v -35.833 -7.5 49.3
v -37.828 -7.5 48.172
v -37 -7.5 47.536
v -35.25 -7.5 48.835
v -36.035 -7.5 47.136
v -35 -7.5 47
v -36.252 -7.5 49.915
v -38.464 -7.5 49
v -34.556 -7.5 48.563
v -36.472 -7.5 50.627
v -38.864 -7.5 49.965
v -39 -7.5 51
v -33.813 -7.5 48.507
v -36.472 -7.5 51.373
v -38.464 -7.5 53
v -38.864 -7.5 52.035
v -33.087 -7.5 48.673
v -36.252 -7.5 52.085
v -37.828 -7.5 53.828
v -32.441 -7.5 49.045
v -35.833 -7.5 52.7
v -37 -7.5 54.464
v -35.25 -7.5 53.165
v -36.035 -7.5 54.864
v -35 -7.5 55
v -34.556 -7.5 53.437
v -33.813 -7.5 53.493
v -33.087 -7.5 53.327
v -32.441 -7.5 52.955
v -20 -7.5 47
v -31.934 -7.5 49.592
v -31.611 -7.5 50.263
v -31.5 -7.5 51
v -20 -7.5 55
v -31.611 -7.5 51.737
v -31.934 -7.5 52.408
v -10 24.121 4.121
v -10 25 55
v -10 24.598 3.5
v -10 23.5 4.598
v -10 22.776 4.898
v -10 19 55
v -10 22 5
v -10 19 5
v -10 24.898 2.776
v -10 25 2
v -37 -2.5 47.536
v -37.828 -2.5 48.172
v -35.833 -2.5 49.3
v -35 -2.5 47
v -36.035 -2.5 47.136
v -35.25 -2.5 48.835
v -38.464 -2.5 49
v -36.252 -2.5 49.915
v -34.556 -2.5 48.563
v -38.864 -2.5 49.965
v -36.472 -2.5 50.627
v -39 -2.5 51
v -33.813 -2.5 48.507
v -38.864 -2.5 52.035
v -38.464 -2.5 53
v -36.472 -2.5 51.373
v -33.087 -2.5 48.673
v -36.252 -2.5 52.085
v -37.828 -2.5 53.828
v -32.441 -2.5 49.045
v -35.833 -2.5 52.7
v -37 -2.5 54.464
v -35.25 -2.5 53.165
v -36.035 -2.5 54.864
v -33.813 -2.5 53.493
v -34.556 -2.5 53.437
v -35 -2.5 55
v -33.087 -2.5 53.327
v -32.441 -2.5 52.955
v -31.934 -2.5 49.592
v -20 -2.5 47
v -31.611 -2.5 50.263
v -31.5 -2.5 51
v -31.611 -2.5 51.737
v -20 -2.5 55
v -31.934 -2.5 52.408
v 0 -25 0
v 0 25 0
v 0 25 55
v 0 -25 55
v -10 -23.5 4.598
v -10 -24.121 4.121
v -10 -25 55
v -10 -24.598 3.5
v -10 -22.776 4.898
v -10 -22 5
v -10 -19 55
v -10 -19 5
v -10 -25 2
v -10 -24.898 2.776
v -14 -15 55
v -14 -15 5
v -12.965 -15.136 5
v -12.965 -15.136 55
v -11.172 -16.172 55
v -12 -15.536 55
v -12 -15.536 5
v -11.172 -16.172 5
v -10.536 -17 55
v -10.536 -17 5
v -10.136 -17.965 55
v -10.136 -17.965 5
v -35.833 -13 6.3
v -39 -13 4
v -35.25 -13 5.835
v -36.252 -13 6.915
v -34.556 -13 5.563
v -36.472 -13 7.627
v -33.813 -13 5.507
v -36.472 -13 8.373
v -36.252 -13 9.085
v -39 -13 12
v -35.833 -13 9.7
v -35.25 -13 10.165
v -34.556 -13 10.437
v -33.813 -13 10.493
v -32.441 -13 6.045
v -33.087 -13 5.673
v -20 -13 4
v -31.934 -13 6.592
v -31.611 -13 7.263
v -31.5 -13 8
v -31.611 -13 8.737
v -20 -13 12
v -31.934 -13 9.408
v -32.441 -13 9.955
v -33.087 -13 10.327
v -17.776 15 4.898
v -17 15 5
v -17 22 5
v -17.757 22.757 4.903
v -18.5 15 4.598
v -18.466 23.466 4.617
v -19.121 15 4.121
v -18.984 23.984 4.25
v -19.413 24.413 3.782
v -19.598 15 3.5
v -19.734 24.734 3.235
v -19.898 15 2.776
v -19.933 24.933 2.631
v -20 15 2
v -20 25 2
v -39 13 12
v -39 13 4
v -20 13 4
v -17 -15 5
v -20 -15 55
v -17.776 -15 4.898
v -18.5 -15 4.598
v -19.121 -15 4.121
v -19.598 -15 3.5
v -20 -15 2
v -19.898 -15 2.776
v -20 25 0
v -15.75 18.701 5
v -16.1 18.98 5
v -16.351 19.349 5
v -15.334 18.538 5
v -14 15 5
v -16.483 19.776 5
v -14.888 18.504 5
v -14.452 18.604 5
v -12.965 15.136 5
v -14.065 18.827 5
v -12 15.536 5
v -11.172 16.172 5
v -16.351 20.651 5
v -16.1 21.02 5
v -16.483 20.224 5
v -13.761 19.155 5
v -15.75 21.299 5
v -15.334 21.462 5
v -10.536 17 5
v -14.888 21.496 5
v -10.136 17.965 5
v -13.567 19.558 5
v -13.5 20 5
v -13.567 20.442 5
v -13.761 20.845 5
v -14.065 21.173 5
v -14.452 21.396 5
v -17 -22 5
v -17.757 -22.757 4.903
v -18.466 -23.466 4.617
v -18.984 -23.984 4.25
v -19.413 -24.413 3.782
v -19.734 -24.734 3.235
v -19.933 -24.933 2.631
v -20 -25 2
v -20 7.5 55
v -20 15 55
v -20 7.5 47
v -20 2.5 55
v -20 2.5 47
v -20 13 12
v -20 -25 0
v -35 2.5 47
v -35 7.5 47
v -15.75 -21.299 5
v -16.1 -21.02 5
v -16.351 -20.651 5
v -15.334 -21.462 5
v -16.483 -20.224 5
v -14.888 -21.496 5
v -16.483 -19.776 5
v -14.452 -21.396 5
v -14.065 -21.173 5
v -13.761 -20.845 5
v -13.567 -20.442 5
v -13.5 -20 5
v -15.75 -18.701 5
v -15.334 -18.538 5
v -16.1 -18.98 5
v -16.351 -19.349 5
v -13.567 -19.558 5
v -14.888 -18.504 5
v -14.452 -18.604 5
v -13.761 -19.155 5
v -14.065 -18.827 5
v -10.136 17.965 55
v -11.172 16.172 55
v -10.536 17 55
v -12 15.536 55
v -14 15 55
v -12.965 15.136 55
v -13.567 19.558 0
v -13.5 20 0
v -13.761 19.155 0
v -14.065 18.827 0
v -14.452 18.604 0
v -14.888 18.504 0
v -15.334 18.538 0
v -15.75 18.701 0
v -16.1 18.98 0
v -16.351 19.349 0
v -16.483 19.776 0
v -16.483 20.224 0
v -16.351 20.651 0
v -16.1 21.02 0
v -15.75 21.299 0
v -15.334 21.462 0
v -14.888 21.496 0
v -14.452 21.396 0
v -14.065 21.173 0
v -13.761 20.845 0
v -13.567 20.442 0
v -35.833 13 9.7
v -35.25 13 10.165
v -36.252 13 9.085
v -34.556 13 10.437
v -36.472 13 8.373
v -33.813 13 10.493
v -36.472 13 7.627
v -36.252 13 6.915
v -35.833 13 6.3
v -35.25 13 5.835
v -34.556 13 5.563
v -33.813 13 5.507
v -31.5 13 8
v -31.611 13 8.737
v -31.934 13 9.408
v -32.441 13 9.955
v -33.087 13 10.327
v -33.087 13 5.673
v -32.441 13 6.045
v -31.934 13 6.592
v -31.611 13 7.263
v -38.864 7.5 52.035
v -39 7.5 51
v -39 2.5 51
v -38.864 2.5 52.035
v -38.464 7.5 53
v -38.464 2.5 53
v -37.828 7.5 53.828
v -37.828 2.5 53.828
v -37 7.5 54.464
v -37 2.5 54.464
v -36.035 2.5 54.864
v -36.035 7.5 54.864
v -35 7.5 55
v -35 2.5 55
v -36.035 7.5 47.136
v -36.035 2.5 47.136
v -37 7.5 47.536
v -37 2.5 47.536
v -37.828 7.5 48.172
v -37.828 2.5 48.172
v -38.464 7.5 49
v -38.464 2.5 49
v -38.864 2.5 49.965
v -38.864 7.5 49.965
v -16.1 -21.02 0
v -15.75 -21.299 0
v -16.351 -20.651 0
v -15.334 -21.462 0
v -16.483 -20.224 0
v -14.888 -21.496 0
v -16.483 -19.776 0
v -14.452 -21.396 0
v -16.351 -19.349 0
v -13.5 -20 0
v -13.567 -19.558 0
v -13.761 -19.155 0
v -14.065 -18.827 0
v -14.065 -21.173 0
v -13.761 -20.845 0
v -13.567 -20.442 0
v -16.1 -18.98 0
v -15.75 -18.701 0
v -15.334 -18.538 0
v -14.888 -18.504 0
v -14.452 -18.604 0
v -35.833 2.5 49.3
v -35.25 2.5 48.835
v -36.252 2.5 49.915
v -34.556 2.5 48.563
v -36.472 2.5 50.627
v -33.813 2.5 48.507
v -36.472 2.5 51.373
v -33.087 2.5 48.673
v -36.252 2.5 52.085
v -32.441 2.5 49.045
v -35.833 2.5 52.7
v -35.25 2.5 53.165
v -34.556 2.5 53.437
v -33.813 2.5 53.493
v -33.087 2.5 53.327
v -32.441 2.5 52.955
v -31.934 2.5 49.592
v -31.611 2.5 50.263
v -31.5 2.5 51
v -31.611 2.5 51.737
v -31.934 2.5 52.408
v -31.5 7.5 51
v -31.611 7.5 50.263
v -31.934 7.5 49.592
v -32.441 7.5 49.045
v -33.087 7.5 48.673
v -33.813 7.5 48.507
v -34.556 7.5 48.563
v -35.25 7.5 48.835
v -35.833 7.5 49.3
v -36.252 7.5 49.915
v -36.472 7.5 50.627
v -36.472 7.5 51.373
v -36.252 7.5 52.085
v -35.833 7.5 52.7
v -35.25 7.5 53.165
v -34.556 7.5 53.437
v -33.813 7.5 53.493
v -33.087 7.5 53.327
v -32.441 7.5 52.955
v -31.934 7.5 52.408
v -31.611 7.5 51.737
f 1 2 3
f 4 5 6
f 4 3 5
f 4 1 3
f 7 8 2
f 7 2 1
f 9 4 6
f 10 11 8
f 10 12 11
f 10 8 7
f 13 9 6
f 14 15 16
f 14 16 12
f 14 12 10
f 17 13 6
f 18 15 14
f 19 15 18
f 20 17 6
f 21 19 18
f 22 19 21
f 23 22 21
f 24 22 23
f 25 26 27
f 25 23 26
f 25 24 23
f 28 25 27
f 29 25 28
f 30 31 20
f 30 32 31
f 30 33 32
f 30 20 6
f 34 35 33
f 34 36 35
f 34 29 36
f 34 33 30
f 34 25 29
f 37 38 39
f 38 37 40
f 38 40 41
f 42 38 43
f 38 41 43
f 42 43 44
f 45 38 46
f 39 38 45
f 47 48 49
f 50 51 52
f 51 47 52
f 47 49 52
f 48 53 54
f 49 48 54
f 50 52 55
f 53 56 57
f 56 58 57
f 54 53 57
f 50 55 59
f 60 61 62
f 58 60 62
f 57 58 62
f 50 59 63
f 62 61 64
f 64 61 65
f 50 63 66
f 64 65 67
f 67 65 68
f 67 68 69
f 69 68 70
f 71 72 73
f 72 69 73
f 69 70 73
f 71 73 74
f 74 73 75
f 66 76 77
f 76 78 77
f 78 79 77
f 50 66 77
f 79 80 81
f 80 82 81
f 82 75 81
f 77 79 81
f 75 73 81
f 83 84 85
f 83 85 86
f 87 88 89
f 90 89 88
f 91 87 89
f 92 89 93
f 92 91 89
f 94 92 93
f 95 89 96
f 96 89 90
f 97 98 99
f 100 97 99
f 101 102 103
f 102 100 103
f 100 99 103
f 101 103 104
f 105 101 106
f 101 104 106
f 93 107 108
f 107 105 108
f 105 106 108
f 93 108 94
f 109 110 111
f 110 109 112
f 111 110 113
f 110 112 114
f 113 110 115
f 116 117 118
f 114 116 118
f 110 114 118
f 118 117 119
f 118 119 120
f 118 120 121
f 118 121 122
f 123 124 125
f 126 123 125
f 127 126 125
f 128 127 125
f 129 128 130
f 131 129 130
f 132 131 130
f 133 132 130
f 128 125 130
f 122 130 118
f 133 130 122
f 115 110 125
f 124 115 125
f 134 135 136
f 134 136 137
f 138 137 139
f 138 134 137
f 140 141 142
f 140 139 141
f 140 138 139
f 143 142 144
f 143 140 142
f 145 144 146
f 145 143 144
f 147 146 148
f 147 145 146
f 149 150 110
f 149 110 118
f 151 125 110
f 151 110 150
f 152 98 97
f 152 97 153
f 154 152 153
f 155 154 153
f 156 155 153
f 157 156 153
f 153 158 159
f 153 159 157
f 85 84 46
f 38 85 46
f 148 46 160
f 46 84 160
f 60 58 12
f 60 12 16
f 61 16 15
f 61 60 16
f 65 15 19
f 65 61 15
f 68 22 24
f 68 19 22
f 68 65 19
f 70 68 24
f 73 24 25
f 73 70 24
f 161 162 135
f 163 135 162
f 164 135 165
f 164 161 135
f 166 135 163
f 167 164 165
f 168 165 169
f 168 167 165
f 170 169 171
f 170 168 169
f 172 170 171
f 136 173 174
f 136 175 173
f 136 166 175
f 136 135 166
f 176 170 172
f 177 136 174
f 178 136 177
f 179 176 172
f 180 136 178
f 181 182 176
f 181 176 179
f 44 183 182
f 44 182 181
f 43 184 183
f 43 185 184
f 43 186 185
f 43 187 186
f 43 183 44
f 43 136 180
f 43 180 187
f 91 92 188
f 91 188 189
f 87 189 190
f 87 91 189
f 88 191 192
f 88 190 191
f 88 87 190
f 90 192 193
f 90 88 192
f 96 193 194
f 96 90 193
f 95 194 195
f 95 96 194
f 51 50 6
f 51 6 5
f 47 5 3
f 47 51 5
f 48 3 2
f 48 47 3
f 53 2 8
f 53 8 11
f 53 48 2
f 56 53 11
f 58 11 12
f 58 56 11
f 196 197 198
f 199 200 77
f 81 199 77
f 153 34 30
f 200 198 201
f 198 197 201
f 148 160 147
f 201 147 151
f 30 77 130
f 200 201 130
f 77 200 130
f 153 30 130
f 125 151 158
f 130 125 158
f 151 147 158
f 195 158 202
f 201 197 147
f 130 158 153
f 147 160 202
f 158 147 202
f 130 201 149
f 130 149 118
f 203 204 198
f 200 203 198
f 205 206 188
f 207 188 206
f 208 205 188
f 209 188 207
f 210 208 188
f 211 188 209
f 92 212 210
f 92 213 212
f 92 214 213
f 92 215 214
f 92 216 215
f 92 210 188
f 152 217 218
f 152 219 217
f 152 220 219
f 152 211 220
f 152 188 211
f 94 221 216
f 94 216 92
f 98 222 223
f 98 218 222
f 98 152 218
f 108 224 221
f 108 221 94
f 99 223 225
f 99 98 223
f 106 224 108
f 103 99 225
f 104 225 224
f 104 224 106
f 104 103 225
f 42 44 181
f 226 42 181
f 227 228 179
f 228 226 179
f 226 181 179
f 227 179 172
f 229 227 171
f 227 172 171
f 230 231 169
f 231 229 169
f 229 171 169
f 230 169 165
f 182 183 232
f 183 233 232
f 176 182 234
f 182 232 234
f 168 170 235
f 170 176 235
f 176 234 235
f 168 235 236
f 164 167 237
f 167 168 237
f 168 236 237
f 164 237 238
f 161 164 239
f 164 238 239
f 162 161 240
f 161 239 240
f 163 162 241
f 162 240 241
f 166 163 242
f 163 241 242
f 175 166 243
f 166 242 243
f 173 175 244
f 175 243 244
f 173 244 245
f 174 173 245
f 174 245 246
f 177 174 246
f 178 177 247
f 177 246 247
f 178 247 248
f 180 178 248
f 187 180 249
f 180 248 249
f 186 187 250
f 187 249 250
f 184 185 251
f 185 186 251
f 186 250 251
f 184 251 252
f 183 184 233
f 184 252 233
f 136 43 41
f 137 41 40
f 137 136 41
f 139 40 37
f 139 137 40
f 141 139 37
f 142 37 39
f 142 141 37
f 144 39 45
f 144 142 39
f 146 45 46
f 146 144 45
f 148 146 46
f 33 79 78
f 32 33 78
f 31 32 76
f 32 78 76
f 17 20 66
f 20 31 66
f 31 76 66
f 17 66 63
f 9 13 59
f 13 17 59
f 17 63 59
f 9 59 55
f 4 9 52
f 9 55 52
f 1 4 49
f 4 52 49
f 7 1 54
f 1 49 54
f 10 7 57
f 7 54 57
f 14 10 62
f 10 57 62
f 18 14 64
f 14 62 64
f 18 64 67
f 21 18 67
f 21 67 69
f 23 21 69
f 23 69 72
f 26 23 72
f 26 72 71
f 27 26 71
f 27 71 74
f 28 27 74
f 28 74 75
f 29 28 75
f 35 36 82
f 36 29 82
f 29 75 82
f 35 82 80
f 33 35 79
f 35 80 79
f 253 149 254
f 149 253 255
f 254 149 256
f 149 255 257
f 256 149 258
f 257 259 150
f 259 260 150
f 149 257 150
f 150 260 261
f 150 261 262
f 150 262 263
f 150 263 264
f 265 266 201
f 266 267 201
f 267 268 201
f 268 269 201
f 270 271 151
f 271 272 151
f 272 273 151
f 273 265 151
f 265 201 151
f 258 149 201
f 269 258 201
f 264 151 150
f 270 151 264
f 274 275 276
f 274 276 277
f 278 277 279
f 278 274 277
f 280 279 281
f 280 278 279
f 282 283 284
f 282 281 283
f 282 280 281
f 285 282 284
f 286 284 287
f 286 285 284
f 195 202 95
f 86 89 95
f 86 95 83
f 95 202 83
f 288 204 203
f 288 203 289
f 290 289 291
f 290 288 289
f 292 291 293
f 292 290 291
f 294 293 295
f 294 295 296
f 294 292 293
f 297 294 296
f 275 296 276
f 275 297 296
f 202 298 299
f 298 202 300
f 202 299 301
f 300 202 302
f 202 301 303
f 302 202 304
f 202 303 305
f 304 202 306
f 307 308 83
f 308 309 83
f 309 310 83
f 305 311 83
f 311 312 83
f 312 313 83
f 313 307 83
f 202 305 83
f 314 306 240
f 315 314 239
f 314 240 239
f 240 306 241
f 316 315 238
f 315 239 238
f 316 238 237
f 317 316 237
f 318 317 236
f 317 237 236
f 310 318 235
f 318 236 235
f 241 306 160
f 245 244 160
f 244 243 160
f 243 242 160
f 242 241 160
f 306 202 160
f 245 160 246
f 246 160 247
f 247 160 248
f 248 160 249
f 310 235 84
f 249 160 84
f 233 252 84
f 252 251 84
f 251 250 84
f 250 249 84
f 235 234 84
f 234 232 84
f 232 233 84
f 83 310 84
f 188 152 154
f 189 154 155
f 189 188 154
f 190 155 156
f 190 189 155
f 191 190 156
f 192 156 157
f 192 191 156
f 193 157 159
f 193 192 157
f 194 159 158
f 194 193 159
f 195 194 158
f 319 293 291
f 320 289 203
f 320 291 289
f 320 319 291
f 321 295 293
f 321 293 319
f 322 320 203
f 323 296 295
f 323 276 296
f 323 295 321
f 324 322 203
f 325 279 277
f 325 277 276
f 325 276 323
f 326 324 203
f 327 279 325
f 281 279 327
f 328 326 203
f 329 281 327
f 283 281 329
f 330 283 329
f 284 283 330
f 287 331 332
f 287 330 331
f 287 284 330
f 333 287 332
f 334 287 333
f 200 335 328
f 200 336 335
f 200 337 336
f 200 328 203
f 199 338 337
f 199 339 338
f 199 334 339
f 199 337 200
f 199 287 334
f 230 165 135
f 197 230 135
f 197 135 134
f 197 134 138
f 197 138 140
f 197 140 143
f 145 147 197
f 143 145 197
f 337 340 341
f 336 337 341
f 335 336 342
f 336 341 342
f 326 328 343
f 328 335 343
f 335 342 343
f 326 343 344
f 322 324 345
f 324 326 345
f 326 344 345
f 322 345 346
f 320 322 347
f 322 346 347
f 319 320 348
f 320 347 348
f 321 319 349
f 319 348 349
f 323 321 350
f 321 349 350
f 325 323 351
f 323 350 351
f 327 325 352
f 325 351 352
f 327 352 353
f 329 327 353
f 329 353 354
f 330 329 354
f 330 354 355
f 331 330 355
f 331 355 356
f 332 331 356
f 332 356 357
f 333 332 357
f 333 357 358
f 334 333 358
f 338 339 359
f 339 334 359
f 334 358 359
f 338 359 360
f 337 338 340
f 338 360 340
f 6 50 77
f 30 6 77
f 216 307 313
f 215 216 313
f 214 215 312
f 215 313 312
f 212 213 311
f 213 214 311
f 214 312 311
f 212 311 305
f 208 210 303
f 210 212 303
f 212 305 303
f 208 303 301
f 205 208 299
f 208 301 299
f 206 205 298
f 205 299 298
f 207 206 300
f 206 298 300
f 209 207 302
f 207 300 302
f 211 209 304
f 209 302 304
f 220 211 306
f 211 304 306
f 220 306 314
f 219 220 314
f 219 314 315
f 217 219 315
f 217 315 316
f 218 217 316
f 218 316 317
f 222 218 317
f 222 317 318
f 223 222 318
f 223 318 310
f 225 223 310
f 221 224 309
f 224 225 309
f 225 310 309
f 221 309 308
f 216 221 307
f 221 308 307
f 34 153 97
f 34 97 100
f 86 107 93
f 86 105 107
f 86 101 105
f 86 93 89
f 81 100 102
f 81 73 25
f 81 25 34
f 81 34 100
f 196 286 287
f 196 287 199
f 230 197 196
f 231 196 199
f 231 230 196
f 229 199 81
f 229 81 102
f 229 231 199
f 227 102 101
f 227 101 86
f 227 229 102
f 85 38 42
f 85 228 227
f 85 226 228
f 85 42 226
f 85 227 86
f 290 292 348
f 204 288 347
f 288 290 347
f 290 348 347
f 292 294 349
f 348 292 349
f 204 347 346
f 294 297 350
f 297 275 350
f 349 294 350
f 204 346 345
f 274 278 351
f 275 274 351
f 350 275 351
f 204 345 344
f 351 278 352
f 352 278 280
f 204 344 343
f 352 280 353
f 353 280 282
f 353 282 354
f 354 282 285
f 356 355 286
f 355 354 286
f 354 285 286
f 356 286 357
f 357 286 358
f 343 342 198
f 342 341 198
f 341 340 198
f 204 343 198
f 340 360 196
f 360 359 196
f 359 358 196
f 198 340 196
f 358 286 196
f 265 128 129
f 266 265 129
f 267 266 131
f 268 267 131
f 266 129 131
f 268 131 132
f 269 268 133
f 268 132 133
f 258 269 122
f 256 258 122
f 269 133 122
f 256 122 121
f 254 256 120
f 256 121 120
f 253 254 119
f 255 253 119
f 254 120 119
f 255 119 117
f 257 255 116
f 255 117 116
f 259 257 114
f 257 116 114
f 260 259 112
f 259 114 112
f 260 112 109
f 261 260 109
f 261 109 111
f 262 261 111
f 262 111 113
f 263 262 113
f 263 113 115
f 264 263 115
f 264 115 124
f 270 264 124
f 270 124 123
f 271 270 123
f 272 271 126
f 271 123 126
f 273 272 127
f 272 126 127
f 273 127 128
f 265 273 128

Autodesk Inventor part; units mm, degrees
ref_plane "YZ Plane" through (0, 0, 0) normal (1, 0, 0) x (0, 1, 0)
ref_plane "XZ Plane" through (0, 0, 0) normal (0, 1, 0) x (-1, 0, 0)
sketch "스케치1" plane through (0, 0, 0) normal (0, 0, 1) x (1, 0, 0)
  line L0 (-20, -25) -> (20, -25)
  line L1 (20, -25) -> (20, 25)
  line L2 (20, 25) -> (-20, 25)
  line L3 (-20, 25) -> (-20, -25)
  line L4 (-20, -25) -> (20, 25) construction
  line L5 (20, -25) -> (-20, 25) construction
  circle A0 centre (-15, 20) radius 1.5
  circle A1 centre (-15, -20) radius 1.5
  circle A2 centre (15, 20) radius 1.5
  circle A3 centre (15, -20) radius 1.5
  line L6 (0, 25) -> (0, -25)
  point P0 (0, 0)
  point P1 (-20, 0)
  dimension "d0" = 40
  dimension "d1" = 50
  dimension "d2" = 30
  dimension "d3" = 15
  dimension "d4" = 40
  dimension "d6" = 20
  dimension "d7" = 3
extrude "돌출1" add sketch "스케치1" along normal blind 5 contours L3 L2 L6 L0
sketch "스케치2" plane through (0, 0, 5) normal (0, 0, 1) x (1, 0, 0)
  circle A0 centre (15, -20) radius 1.5 projected
  circle A1 centre (-15, -20) radius 1.5 projected
  line L0 (0, 25) -> (-20, 25) projected
  line L1 (-20, 25) -> (-20, -25) projected
  line L2 (-20, -25) -> (0, -25) projected
  circle A2 centre (-15, 20) radius 1.5 projected
  circle A3 centre (-15, -20) radius 1.5 projected
  line L3 (-20, -25) -> (20, -25) projected
  line L4 (14, -15) -> (20, -15)
  line L5 (10, -25) -> (10, -19)
  arc A4 (14, -15) -> (10, -19) centre (14, -19) ccw
  line L6 (-28, 0) -> (28, 0) projected
  line L7 (0, -35) -> (0, 35) projected
  line L8 (-14, -15) -> (-20, -15)
  line L9 (-10, -25) -> (-10, -19)
  arc A5 (-10, -19) -> (-14, -15) centre (-14, -19) ccw
  line L10 (14, 15) -> (20, 15)
  line L11 (10, 25) -> (10, 19)
  arc A6 (10, 19) -> (14, 15) centre (14, 19) ccw
  line L12 (-10, 25) -> (-10, 19)
  arc A7 (-14, 15) -> (-10, 19) centre (-14, 19) ccw
  line L13 (-14, 15) -> (-20, 15)
  line L14 (0, -25) -> (0, 25) projected
  point P0 (10, -15)
  point P1 (0, 0)
  dimension "d13" = 10
  dimension "d16" = 4
extrude "돌출2" add sketch "스케치2" along normal blind 50 contours L7 L6 L1 L13 A7 L12 L0 | L7 L2 L9 A5 L8 L1 L6
fillet "모깎기1" radius 3 4 edges at (-15, -25, 5) (-20, -20, 5) (-15, 25, 5) (-20, 20, 5)
sketch "스케치3" plane through (-20, -25, 0) normal (-1, 0, 0) x (0, 0, 1)
  line L0 (2, 40) -> (55, 40) projected
  line L1 (5, 10) -> (55, 10) projected
  line L2 (4, 40) -> (12, 40)
  line L3 (12, 40) -> (12, 10)
  line L4 (12, 10) -> (4, 10)
  line L5 (4, 10) -> (4, 40)
  line L6 (0, 50) -> (0, 0) projected
  line L7 (12, 32) -> (4, 32)
  line L8 (4, 32) -> (4, 18)
  line L9 (4, 18) -> (12, 18)
  line L10 (12, 18) -> (12, 32)
  line L11 (12, 38) -> (4, 38)
  line L12 (4, 38) -> (4, 12)
  line L13 (4, 12) -> (12, 12)
  line L14 (12, 12) -> (12, 38)
  point P0 (0, 25)
  point P1 (15, 10)
  point P2 (12, 25)
  point P3 (4, 25)
  point P4 (12, 18)
  point P5 (12, 25)
  point P6 (8, 12)
  dimension "d17" = 8
  dimension "d18" = 4
  dimension "d21" = 8
  dimension "d28" = 26
extrude "돌출3" add sketch "스케치3" along normal blind 19 contours L11 L3 L7 L5 | L7 L3 L9 L5 | L9 L3 L13 L5
sketch "스케치5" plane through (-20, -13, 4) normal (0, -1, 0) x (1, 0, 0)
  circle A0 centre (-14, 4) radius 2.5
  line L0 (-19, 0) -> (-19, 8) projected
  point P0 (20, -4)
  point P1 (-19, 4)
  dimension "d29" = 5
  dimension "d30" = 5
extrude "돌출5" cut sketch "스케치5" against normal through all
ref_plane "작업 평면1" through (-20, 0, 0) normal (0, -1, 0) x (1, 0, 0)
sketch "스케치6" plane through (-20, 0, 0) normal (0, -1, 0) x (1, 0, 0)
  line L0 (0, 2) -> (0, 55) projected
  line L1 (0, 55) -> (-19, 55)
  line L2 (-19, 55) -> (-19, 47)
  line L3 (-19, 47) -> (0, 47)
  line L4 (0, 47) -> (0, 55)
  line L5 (-19, 12) -> (-19, 4) projected
  circle A0 centre (-14, 51) radius 2.5
  circle A1 centre (-14, 8) radius 2.5 projected
  point P0 (20, 0)
  point P1 (0, 47)
  dimension "d31" = 0
  dimension "d33" = 8
  dimension "d34" = 8
  dimension "d35" = 4
extrude "돌출6" add sketch "스케치6" along normal mid plane 15 contours L3 L2 L1 L0
extrude "돌출7" cut sketch "스케치6" along normal mid plane 5 contours L3 L2 L1 L0
fillet "모깎기2" radius 4 4 edges at (-39, 5, 55) (-39, 5, 47) (-39, -5, 55) (-39, -5, 47)
equation "\"d3\" = 0.5 * d2"
equation "\"d6\" = 0.5 * d4"
equation "\"d34\" = d33"
equation "\"d35\" = 0.5 * d34"
properties part number "SuspensionSupporter"
